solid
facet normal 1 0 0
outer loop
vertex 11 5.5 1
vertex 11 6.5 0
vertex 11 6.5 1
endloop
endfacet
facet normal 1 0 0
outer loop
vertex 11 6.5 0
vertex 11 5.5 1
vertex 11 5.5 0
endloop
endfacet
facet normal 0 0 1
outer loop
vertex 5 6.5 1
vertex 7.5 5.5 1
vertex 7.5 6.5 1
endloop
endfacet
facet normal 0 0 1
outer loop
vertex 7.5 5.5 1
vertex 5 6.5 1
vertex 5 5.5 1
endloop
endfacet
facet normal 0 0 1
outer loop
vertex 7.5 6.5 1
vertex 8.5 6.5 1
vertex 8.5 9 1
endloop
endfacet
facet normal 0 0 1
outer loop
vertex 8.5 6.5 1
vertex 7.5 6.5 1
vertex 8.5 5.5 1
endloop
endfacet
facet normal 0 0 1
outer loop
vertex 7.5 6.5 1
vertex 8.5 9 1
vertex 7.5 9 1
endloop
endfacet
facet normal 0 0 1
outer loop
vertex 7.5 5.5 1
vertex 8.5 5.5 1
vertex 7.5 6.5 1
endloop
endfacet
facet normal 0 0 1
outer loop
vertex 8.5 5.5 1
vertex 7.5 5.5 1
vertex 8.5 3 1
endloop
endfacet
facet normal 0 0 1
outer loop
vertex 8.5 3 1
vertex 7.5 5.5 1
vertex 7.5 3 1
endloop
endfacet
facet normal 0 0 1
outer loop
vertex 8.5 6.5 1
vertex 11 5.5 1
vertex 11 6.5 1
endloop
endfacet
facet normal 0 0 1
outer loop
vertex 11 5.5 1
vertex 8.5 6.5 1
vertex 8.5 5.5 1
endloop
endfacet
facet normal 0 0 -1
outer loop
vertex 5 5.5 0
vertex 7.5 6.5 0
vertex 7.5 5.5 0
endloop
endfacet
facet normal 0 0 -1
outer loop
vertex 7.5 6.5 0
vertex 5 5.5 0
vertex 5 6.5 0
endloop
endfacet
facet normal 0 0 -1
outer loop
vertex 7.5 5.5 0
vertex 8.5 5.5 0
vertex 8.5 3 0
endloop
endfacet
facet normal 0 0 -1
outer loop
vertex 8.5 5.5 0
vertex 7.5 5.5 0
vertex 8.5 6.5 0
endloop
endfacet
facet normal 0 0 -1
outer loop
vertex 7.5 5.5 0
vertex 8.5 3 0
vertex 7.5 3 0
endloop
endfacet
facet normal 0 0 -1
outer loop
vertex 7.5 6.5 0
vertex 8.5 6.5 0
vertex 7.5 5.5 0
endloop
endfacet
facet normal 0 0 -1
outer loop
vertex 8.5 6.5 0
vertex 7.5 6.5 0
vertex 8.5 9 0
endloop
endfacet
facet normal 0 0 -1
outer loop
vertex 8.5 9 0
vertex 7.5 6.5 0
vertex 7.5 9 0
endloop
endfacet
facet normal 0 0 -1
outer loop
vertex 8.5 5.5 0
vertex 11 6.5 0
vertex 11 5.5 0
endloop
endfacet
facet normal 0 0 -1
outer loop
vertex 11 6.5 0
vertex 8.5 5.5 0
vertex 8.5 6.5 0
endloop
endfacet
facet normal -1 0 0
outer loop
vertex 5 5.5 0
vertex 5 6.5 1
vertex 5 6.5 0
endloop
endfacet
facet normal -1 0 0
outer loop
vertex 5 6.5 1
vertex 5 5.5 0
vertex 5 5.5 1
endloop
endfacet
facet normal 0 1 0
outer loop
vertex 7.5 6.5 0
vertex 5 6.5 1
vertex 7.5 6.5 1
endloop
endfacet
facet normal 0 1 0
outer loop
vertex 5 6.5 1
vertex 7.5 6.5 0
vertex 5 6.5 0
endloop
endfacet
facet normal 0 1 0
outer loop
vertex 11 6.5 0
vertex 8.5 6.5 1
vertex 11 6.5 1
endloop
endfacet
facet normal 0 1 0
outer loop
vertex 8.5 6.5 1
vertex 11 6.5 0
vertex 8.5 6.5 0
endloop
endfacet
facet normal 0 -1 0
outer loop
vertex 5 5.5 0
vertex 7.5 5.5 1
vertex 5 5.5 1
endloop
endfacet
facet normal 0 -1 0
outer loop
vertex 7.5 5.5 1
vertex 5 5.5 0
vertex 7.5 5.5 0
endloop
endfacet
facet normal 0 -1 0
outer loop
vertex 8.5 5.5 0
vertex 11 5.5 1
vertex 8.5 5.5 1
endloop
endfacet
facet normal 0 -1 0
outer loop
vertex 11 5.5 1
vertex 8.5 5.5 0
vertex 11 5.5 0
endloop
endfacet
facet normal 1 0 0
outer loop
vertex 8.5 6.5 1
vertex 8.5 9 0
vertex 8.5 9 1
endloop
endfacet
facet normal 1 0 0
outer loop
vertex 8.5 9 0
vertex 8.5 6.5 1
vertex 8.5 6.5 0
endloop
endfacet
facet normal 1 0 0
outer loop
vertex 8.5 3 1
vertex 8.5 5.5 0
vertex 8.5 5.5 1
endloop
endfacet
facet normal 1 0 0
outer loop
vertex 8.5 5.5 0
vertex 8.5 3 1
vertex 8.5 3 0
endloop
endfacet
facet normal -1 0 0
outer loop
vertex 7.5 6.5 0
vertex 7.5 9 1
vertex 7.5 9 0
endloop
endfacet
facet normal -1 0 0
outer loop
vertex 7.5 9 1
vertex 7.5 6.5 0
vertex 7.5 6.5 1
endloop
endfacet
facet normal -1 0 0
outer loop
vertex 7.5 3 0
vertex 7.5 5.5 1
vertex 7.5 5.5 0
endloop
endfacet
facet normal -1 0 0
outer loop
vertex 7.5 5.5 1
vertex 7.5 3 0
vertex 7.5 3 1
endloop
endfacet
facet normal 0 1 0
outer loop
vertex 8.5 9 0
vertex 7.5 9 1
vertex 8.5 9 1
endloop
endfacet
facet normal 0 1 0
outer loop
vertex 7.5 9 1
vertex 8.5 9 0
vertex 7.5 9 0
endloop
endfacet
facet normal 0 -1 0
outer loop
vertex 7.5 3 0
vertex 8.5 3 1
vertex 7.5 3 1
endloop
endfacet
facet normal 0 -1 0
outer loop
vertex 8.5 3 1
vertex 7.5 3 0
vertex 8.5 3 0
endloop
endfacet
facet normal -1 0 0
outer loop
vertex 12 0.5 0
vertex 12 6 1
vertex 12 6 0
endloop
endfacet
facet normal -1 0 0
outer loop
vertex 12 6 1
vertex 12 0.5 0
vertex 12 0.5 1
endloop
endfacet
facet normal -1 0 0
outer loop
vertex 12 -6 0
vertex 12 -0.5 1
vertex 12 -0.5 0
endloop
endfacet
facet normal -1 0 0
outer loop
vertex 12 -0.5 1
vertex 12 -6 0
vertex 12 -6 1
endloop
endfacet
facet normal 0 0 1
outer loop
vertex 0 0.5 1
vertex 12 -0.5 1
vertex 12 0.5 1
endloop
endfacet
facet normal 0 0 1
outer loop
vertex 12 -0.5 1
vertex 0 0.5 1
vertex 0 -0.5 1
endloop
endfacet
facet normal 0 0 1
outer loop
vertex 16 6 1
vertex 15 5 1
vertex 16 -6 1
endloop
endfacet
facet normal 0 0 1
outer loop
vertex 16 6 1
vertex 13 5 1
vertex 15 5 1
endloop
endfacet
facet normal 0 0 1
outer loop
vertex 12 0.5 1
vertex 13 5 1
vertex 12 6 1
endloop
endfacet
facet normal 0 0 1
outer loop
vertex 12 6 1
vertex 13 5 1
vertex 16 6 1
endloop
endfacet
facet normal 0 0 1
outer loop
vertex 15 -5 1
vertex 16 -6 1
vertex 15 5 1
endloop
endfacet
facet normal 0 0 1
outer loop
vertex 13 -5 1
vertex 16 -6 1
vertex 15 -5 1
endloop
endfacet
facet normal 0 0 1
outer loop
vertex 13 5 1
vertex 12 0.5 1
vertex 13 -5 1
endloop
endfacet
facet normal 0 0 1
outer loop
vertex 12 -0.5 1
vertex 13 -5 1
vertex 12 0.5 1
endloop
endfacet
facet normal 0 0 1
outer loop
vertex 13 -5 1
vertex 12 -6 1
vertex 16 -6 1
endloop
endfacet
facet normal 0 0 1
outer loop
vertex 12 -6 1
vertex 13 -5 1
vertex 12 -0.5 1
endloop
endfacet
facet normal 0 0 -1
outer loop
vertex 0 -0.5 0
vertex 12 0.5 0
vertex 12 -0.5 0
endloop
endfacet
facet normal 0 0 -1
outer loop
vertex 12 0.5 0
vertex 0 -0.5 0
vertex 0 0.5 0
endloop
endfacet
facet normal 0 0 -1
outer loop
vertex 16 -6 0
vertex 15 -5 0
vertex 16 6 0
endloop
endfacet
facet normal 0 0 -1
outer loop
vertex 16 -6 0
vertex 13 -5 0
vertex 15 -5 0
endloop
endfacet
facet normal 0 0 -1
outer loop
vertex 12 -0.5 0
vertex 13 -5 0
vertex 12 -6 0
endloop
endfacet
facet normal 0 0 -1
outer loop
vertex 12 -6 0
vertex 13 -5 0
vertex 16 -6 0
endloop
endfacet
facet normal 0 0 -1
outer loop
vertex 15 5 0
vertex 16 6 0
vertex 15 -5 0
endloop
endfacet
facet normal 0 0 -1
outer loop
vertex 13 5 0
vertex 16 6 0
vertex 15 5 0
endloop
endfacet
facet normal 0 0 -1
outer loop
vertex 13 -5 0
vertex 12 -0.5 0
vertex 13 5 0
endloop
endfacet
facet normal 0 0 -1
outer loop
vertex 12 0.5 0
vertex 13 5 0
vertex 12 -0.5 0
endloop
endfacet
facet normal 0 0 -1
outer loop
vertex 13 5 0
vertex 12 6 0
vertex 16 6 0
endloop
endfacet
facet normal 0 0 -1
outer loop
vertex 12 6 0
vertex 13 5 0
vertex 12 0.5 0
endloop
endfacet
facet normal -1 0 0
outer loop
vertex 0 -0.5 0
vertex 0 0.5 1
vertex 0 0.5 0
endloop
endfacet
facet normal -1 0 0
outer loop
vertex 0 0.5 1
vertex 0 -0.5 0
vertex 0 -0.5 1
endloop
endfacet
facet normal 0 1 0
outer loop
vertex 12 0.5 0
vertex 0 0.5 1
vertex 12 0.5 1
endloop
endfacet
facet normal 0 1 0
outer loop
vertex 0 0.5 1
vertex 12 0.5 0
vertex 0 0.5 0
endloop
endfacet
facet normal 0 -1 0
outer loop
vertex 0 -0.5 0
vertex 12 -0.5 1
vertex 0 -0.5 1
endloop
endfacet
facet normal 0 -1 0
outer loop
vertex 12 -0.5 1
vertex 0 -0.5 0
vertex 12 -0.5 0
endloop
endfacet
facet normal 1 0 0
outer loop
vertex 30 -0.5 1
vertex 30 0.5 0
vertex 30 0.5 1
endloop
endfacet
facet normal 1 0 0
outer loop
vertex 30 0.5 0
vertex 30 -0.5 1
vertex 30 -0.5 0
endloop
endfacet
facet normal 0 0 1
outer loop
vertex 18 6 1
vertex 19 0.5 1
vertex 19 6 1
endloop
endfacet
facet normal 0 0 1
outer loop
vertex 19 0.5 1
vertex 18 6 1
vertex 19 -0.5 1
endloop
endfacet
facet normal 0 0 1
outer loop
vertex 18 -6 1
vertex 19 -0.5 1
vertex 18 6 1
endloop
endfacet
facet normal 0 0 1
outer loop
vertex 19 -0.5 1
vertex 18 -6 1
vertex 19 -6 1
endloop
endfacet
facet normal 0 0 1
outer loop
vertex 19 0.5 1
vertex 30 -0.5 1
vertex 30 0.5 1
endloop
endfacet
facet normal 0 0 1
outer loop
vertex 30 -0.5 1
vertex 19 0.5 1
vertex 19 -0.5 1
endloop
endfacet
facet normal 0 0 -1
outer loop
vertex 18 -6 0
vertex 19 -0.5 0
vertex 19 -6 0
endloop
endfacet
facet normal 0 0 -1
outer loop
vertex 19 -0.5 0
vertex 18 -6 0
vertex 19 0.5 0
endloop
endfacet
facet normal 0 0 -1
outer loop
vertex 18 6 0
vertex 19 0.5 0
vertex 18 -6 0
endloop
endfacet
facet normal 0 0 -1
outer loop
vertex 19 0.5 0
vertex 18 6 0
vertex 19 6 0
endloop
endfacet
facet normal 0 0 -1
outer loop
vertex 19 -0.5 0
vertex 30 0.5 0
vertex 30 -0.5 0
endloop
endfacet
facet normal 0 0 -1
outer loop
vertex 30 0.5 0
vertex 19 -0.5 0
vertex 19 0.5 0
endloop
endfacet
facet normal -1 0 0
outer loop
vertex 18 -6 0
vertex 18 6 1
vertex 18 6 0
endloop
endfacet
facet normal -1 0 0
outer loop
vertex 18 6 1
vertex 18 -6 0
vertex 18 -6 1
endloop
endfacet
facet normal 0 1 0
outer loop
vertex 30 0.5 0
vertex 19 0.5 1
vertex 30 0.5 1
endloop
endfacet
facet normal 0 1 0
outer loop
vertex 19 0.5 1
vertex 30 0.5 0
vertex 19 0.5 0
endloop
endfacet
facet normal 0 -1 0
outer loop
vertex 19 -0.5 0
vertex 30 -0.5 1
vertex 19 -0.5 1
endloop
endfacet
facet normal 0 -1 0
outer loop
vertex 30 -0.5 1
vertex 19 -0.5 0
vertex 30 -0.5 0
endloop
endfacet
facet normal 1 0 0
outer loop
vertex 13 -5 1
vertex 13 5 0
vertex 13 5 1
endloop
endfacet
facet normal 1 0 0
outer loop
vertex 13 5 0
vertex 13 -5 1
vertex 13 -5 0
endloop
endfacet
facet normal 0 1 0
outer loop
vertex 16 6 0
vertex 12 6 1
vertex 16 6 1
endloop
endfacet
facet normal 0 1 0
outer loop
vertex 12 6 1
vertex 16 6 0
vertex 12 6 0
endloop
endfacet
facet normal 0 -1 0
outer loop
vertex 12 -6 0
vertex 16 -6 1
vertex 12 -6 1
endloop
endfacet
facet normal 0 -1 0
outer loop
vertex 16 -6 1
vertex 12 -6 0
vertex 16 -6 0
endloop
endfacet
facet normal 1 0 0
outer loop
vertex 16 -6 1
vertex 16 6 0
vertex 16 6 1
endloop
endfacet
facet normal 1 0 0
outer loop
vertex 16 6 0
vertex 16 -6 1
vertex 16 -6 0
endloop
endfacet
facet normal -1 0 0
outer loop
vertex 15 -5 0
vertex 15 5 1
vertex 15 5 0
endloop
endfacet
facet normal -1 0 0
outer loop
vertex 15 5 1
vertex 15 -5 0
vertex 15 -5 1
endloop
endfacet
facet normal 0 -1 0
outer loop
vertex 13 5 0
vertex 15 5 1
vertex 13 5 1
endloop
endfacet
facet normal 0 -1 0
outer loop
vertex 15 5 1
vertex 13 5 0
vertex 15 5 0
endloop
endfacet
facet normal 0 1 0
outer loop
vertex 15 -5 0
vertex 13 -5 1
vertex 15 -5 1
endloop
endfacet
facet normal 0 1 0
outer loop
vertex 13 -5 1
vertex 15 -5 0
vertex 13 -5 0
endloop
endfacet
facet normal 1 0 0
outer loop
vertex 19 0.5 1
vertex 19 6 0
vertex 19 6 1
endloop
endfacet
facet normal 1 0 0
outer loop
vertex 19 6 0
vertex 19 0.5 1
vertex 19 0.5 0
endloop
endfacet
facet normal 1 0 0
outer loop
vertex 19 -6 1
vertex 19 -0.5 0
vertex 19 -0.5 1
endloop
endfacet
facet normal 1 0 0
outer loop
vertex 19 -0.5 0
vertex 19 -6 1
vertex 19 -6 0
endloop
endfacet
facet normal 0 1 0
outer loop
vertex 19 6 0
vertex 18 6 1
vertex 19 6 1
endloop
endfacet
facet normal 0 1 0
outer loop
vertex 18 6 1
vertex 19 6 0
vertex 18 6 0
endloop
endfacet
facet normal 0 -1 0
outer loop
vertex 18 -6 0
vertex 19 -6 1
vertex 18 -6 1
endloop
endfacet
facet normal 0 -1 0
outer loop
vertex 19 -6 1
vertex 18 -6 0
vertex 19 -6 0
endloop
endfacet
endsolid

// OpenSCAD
// file: sym_plus.scad
module plus(size, thickness, height)
{
    translate([-size/2,-thickness/2, 0]) cube([size, thickness, height]);
    translate([-thickness/2,-size/2, 0]) cube([thickness, size, height]);
}
// main file
use <sym_plus.scad>

module capacitor_polar(length, width, thickness, height)
{
    //left wire
    translate([0,-thickness/2,0])cube([length/2-width/4, thickness, height]);
    translate([(length/2+width/4),-thickness/2,0])cube([(length/2-width/4), thickness, height]);
    
    //left vertical
    translate([(length-width/2)/2,-width/2, 0])cube([thickness, width, height]);
    
    //middle vertical
    translate([(length)/2,-width/2, 0])cube([thickness, width, height]);
    
    //bottom horizontal
    translate([(length-width/2)/2,width/2-thickness,0]) cube([width/4,thickness,height]);
    
    //top horizontal
    translate([(length-width/2)/2,-width/2,0]) cube([width/4,thickness,height]);
    
    //+
    translate([length/2-width/2-thickness, 2*width/4,0]) plus(width/2, thickness, height);
    
    //right vertical
    translate([(length+width/2)/2,-width/2, 0])cube([thickness, width, height]);
}

capacitor_polar(30, 12, 1, 1);
